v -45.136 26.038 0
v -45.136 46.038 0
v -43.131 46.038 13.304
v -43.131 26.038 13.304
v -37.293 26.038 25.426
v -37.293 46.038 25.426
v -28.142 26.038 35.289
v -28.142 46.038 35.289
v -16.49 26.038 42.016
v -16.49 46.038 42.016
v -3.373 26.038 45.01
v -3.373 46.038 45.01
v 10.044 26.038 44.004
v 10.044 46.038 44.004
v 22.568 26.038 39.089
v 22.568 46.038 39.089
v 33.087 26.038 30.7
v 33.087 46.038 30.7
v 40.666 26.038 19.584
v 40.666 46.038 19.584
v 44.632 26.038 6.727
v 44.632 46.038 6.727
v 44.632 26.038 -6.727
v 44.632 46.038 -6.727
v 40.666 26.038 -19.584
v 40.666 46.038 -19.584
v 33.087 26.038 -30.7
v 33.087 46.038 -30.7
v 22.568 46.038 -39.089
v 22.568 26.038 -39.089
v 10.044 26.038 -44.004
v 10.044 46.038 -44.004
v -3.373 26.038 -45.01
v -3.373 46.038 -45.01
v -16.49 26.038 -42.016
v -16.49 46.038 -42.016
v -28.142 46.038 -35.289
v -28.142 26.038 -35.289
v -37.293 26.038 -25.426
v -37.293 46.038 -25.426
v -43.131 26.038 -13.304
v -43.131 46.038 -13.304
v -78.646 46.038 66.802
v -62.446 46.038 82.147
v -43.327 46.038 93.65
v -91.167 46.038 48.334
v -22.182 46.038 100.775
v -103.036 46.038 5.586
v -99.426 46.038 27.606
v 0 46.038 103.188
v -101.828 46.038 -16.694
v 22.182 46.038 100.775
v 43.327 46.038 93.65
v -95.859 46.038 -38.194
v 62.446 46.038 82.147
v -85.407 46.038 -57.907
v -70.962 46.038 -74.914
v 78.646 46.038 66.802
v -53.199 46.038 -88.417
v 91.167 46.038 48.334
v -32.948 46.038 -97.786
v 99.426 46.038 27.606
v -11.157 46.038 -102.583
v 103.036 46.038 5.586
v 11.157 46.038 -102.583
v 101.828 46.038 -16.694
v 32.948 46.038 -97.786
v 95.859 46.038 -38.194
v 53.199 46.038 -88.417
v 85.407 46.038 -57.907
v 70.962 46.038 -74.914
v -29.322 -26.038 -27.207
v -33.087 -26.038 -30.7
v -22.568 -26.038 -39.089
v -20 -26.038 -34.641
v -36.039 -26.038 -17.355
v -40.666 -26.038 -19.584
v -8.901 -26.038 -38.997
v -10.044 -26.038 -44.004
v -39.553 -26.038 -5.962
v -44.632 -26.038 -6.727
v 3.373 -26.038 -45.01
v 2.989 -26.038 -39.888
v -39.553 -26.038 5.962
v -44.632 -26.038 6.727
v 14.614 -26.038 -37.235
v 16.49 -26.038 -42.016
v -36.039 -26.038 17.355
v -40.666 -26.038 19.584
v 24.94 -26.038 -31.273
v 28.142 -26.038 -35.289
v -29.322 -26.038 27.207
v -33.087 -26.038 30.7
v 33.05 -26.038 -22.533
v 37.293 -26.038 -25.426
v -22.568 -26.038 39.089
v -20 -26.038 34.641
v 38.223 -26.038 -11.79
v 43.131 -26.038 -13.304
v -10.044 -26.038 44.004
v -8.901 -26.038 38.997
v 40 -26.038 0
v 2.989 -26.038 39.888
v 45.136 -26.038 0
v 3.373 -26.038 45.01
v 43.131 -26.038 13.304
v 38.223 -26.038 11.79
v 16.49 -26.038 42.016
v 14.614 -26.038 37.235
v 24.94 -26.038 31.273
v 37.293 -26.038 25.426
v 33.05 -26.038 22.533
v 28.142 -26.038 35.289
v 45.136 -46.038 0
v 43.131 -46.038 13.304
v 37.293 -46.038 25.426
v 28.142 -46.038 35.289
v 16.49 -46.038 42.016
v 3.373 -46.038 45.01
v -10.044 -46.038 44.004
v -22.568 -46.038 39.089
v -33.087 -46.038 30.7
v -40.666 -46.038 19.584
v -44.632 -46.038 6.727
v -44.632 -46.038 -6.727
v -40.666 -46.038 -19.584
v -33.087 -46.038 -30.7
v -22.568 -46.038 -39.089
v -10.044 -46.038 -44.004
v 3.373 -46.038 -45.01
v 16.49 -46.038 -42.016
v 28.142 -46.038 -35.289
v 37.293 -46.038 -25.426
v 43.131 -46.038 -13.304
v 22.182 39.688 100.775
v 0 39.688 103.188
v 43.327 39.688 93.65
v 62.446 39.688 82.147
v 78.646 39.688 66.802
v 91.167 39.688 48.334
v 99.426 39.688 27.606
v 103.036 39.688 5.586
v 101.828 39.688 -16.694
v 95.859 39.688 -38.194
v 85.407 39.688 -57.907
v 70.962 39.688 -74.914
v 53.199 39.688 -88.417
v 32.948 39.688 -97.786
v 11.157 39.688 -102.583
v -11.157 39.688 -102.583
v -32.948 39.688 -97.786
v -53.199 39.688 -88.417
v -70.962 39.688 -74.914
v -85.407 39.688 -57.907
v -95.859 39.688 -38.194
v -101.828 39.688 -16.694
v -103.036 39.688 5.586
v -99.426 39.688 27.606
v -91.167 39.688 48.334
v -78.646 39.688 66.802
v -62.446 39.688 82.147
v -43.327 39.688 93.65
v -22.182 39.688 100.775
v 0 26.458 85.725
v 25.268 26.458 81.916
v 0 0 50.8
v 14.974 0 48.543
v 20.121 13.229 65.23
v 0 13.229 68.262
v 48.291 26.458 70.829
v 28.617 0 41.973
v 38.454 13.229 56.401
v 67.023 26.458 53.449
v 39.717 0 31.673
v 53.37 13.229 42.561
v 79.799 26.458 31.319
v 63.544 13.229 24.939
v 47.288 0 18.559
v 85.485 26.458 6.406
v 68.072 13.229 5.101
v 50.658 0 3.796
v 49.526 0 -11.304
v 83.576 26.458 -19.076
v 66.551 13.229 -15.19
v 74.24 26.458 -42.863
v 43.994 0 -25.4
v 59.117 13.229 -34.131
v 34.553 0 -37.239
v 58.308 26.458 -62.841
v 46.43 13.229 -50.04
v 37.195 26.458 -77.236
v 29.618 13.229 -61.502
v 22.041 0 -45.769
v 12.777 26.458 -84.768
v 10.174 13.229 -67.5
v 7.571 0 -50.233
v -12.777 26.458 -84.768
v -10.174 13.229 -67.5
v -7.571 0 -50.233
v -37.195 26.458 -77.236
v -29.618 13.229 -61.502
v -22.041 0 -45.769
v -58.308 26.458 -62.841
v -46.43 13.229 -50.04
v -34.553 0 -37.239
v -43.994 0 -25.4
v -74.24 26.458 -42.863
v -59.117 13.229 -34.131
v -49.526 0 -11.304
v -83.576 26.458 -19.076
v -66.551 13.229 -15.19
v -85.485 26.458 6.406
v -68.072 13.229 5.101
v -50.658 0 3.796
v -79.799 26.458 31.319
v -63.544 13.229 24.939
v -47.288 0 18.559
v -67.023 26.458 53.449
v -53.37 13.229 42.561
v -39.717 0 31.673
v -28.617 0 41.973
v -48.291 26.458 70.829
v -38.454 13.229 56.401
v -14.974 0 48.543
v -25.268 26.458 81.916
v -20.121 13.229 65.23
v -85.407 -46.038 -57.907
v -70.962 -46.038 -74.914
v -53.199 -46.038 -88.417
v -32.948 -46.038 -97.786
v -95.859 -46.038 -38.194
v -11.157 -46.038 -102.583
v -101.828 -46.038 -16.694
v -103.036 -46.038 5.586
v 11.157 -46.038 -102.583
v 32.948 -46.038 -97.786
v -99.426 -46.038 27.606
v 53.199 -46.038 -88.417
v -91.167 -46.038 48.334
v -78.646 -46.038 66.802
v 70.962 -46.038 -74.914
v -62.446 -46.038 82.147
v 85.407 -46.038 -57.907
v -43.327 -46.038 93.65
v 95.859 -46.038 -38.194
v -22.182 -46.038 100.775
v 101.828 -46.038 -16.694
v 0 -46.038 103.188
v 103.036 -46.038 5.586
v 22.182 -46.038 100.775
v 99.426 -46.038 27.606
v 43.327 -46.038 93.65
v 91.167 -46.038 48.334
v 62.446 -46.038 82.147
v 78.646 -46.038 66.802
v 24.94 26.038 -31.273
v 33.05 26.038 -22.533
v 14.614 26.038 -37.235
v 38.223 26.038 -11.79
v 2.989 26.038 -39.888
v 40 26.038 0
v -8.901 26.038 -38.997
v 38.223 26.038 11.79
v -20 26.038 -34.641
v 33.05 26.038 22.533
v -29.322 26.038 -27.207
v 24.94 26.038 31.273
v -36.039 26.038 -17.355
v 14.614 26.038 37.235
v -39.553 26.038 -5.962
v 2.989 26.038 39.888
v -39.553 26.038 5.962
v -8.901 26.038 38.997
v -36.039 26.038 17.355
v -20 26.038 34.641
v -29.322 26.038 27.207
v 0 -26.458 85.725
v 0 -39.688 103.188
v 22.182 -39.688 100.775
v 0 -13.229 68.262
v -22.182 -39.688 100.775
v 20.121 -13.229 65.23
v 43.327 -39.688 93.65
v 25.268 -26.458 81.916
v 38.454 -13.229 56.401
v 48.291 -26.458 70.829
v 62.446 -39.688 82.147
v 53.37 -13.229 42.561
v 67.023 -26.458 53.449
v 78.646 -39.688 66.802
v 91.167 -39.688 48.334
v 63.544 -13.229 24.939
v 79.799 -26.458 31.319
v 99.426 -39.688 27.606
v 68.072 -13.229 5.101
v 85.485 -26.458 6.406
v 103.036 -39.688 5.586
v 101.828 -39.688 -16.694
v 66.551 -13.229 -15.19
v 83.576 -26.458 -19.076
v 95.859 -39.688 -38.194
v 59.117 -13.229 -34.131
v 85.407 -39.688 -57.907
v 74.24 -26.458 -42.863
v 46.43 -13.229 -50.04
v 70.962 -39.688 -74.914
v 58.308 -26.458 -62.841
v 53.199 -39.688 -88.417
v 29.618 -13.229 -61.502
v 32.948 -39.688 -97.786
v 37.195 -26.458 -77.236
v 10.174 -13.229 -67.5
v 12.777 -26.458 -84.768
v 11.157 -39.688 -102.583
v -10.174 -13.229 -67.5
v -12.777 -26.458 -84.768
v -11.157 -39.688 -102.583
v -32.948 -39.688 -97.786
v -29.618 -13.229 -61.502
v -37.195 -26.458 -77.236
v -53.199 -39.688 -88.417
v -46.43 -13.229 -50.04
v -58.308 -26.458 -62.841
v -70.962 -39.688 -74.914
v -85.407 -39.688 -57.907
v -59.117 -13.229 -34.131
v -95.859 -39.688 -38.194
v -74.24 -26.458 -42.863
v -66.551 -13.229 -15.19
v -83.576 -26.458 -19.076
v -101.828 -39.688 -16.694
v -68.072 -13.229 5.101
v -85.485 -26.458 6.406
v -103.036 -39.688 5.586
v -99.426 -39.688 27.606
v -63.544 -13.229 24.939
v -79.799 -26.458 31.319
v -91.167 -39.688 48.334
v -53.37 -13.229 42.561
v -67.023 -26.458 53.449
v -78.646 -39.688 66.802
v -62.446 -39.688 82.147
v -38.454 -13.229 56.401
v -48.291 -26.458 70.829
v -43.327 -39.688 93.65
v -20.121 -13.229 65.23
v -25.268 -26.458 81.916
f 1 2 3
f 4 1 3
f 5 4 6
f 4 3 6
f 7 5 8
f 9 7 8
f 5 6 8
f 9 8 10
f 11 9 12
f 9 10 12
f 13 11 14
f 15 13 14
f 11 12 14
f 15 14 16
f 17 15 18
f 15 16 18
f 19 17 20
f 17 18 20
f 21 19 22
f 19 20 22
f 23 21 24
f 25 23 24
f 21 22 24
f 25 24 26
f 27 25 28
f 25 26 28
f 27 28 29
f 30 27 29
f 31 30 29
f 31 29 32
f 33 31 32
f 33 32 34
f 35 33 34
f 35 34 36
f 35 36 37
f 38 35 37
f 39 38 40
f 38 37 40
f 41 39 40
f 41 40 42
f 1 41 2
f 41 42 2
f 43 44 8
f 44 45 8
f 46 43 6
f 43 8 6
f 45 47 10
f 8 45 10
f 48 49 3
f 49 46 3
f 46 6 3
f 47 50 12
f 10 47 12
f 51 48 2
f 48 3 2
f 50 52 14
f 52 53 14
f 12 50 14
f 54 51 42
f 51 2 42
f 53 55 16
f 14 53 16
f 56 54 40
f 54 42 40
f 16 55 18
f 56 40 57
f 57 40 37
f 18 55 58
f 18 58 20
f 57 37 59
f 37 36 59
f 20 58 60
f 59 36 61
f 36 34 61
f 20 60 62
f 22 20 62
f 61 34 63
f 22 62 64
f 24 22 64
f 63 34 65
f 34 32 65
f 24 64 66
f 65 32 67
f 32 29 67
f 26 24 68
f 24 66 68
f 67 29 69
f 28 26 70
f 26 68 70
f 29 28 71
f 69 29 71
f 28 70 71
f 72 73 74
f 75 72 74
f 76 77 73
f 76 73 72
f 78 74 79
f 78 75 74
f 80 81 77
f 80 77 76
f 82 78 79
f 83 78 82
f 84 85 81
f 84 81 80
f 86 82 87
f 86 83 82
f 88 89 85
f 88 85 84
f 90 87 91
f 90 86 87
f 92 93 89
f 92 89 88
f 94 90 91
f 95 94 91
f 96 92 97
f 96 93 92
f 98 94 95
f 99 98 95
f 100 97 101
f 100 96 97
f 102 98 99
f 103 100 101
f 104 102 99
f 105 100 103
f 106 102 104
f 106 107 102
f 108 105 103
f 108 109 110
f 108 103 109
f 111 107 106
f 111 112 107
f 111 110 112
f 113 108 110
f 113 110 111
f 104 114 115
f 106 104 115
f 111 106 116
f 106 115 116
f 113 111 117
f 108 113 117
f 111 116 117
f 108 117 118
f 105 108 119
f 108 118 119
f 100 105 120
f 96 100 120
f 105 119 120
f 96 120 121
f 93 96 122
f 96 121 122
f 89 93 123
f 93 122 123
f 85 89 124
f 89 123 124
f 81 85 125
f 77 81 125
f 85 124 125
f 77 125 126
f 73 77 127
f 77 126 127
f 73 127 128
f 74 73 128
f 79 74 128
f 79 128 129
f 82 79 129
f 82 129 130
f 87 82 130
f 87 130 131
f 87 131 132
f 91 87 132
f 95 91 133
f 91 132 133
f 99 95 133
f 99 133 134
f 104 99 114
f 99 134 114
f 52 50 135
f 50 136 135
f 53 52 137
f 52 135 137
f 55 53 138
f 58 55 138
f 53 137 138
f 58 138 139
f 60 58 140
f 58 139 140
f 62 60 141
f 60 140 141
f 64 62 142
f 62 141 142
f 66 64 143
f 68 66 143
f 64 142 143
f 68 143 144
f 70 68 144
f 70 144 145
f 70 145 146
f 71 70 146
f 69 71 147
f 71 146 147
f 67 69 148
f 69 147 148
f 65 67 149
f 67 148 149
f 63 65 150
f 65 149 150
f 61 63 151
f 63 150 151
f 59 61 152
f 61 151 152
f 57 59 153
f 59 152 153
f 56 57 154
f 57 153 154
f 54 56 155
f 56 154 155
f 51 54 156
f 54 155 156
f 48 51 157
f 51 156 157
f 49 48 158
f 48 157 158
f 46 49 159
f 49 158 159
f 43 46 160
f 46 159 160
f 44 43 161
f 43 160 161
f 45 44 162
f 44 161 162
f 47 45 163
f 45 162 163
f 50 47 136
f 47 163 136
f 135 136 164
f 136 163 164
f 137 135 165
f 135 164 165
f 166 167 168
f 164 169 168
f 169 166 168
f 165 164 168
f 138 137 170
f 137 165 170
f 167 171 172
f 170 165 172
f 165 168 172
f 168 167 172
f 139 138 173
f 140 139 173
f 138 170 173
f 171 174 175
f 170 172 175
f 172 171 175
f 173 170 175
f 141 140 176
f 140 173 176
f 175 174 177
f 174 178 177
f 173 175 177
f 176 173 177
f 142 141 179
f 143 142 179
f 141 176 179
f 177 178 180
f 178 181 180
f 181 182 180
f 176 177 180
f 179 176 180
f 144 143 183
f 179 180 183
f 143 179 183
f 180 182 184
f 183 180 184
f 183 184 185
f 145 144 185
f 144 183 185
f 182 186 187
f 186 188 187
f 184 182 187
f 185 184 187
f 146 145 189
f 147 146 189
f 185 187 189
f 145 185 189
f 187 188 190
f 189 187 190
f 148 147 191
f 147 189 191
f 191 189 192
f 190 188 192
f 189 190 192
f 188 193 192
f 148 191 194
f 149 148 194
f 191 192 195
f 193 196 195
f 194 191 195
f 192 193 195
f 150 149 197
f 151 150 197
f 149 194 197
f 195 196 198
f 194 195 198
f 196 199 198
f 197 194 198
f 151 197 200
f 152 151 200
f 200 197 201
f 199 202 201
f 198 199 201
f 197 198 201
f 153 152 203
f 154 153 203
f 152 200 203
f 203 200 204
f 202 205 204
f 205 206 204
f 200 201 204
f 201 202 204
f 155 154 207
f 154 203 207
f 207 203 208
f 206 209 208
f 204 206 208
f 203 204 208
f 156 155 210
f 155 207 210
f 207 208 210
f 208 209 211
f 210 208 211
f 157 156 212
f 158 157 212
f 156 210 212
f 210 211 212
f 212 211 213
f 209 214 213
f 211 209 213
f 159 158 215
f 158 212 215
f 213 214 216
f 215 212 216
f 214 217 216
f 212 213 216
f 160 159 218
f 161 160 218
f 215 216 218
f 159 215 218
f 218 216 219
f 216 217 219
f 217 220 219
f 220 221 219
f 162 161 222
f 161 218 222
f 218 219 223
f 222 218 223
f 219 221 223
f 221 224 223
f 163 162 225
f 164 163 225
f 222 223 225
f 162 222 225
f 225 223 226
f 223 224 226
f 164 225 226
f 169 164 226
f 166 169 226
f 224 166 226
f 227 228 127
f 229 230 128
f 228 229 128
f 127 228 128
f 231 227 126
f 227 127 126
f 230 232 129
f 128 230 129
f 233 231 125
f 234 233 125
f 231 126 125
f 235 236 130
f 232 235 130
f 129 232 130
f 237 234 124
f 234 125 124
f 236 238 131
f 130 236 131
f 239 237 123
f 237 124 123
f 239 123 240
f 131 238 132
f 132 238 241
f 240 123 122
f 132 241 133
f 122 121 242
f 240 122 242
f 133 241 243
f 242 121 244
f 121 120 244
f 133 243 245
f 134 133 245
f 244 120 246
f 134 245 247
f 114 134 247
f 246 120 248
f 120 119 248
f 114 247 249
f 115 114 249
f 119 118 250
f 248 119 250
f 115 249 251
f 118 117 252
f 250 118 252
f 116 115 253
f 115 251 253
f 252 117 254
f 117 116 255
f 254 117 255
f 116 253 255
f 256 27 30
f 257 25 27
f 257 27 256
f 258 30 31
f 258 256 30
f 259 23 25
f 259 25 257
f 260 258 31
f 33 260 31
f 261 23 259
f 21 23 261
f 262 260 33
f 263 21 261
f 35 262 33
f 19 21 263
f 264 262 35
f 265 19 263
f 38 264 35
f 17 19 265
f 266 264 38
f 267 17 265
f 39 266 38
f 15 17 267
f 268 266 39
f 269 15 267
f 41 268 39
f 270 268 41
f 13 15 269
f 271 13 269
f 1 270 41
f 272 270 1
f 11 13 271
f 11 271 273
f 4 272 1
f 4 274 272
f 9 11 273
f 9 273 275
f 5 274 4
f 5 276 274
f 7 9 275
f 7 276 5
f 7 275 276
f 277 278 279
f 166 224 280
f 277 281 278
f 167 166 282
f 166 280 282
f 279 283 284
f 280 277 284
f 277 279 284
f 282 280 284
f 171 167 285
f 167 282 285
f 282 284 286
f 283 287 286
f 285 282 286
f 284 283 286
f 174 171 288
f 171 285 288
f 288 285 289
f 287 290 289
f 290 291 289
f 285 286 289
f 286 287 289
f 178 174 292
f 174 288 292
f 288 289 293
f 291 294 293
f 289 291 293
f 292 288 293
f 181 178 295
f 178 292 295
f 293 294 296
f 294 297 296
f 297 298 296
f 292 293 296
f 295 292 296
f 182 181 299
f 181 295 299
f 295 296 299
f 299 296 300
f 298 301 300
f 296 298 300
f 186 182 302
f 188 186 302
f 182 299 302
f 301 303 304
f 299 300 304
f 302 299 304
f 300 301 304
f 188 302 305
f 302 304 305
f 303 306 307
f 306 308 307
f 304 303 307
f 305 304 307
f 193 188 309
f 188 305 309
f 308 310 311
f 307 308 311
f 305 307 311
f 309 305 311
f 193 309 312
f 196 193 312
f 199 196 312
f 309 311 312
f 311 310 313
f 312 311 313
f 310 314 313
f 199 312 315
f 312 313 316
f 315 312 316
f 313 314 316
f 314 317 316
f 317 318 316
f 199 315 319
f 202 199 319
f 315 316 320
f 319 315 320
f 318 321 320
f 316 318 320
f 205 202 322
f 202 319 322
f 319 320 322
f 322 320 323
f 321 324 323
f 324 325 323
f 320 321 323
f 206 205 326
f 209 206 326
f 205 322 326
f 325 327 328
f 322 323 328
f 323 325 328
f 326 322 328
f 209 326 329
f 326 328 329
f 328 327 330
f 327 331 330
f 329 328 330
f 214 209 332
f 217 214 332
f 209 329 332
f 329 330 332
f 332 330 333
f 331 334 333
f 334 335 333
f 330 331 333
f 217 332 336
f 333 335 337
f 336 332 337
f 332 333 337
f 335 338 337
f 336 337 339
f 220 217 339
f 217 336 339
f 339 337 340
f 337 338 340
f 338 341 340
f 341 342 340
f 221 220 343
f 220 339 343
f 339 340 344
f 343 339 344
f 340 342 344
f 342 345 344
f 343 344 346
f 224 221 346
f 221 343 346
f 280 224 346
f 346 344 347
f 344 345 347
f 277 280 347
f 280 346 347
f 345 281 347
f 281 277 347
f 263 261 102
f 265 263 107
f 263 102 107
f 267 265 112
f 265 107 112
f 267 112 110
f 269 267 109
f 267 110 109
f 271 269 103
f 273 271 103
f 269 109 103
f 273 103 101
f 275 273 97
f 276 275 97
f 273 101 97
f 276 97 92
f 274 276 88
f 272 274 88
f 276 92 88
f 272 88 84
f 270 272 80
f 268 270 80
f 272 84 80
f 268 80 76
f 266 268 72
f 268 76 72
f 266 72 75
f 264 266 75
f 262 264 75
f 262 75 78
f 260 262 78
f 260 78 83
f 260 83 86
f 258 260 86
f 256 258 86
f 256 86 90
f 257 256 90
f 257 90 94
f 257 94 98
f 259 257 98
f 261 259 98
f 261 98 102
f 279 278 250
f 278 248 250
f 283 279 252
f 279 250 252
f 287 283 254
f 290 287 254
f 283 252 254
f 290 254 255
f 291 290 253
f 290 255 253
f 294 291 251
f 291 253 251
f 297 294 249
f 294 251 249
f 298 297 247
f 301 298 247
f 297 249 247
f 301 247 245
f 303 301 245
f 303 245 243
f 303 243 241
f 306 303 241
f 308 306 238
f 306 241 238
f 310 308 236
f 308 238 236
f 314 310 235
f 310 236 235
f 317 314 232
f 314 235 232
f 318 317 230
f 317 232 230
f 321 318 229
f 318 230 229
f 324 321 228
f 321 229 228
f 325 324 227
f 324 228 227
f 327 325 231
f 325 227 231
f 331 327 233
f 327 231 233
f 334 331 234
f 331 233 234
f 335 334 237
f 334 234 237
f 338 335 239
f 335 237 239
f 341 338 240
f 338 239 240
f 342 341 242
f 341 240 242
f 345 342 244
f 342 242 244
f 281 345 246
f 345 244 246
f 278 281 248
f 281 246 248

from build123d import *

# Parameters (mm, degrees)
F2_R     = 45.1358
F3_DEPTH = 20
F4_R     = 45.1358
F5_DEPTH = 20
F6_R     = 40
F7_DEPTH = 127


with BuildPart() as f1:
    # F0 (on Right) → F1 (revolve)
    with BuildSketch(Plane.YZ):
        Polygon((-46.0375, 0), (0, 0), (0, 50.8), (-39.6875, 103.1875), (-46.0375, 103.1875), align=None)
        Polygon((0, 0), (46.0375, 0), (46.0375, 103.1875), (39.6875, 103.1875), (0, 50.8), align=None)
    revolve(axis=Axis((0, 0, 0), (0, 1, 0)))

    # F2 (on face) → F3 (cut)
    with BuildSketch(Plane(origin=(0, 46.0375, 0), x_dir=(-1, 0, 0), z_dir=(0, 1, 0))):
        Circle(F2_R)
    extrude(amount=-F3_DEPTH, mode=Mode.SUBTRACT)

    # F4 (on face) → F5 (cut)
    with BuildSketch(Plane.XZ.offset(46.0375)):
        Circle(F4_R)
    extrude(amount=-F5_DEPTH, mode=Mode.SUBTRACT)

    # F6 (on face) → F7 (cut)
    with BuildSketch(Plane.XZ.offset(26.0375)):
        Circle(F6_R)
    extrude(amount=-F7_DEPTH, mode=Mode.SUBTRACT)


solid = f1.part
